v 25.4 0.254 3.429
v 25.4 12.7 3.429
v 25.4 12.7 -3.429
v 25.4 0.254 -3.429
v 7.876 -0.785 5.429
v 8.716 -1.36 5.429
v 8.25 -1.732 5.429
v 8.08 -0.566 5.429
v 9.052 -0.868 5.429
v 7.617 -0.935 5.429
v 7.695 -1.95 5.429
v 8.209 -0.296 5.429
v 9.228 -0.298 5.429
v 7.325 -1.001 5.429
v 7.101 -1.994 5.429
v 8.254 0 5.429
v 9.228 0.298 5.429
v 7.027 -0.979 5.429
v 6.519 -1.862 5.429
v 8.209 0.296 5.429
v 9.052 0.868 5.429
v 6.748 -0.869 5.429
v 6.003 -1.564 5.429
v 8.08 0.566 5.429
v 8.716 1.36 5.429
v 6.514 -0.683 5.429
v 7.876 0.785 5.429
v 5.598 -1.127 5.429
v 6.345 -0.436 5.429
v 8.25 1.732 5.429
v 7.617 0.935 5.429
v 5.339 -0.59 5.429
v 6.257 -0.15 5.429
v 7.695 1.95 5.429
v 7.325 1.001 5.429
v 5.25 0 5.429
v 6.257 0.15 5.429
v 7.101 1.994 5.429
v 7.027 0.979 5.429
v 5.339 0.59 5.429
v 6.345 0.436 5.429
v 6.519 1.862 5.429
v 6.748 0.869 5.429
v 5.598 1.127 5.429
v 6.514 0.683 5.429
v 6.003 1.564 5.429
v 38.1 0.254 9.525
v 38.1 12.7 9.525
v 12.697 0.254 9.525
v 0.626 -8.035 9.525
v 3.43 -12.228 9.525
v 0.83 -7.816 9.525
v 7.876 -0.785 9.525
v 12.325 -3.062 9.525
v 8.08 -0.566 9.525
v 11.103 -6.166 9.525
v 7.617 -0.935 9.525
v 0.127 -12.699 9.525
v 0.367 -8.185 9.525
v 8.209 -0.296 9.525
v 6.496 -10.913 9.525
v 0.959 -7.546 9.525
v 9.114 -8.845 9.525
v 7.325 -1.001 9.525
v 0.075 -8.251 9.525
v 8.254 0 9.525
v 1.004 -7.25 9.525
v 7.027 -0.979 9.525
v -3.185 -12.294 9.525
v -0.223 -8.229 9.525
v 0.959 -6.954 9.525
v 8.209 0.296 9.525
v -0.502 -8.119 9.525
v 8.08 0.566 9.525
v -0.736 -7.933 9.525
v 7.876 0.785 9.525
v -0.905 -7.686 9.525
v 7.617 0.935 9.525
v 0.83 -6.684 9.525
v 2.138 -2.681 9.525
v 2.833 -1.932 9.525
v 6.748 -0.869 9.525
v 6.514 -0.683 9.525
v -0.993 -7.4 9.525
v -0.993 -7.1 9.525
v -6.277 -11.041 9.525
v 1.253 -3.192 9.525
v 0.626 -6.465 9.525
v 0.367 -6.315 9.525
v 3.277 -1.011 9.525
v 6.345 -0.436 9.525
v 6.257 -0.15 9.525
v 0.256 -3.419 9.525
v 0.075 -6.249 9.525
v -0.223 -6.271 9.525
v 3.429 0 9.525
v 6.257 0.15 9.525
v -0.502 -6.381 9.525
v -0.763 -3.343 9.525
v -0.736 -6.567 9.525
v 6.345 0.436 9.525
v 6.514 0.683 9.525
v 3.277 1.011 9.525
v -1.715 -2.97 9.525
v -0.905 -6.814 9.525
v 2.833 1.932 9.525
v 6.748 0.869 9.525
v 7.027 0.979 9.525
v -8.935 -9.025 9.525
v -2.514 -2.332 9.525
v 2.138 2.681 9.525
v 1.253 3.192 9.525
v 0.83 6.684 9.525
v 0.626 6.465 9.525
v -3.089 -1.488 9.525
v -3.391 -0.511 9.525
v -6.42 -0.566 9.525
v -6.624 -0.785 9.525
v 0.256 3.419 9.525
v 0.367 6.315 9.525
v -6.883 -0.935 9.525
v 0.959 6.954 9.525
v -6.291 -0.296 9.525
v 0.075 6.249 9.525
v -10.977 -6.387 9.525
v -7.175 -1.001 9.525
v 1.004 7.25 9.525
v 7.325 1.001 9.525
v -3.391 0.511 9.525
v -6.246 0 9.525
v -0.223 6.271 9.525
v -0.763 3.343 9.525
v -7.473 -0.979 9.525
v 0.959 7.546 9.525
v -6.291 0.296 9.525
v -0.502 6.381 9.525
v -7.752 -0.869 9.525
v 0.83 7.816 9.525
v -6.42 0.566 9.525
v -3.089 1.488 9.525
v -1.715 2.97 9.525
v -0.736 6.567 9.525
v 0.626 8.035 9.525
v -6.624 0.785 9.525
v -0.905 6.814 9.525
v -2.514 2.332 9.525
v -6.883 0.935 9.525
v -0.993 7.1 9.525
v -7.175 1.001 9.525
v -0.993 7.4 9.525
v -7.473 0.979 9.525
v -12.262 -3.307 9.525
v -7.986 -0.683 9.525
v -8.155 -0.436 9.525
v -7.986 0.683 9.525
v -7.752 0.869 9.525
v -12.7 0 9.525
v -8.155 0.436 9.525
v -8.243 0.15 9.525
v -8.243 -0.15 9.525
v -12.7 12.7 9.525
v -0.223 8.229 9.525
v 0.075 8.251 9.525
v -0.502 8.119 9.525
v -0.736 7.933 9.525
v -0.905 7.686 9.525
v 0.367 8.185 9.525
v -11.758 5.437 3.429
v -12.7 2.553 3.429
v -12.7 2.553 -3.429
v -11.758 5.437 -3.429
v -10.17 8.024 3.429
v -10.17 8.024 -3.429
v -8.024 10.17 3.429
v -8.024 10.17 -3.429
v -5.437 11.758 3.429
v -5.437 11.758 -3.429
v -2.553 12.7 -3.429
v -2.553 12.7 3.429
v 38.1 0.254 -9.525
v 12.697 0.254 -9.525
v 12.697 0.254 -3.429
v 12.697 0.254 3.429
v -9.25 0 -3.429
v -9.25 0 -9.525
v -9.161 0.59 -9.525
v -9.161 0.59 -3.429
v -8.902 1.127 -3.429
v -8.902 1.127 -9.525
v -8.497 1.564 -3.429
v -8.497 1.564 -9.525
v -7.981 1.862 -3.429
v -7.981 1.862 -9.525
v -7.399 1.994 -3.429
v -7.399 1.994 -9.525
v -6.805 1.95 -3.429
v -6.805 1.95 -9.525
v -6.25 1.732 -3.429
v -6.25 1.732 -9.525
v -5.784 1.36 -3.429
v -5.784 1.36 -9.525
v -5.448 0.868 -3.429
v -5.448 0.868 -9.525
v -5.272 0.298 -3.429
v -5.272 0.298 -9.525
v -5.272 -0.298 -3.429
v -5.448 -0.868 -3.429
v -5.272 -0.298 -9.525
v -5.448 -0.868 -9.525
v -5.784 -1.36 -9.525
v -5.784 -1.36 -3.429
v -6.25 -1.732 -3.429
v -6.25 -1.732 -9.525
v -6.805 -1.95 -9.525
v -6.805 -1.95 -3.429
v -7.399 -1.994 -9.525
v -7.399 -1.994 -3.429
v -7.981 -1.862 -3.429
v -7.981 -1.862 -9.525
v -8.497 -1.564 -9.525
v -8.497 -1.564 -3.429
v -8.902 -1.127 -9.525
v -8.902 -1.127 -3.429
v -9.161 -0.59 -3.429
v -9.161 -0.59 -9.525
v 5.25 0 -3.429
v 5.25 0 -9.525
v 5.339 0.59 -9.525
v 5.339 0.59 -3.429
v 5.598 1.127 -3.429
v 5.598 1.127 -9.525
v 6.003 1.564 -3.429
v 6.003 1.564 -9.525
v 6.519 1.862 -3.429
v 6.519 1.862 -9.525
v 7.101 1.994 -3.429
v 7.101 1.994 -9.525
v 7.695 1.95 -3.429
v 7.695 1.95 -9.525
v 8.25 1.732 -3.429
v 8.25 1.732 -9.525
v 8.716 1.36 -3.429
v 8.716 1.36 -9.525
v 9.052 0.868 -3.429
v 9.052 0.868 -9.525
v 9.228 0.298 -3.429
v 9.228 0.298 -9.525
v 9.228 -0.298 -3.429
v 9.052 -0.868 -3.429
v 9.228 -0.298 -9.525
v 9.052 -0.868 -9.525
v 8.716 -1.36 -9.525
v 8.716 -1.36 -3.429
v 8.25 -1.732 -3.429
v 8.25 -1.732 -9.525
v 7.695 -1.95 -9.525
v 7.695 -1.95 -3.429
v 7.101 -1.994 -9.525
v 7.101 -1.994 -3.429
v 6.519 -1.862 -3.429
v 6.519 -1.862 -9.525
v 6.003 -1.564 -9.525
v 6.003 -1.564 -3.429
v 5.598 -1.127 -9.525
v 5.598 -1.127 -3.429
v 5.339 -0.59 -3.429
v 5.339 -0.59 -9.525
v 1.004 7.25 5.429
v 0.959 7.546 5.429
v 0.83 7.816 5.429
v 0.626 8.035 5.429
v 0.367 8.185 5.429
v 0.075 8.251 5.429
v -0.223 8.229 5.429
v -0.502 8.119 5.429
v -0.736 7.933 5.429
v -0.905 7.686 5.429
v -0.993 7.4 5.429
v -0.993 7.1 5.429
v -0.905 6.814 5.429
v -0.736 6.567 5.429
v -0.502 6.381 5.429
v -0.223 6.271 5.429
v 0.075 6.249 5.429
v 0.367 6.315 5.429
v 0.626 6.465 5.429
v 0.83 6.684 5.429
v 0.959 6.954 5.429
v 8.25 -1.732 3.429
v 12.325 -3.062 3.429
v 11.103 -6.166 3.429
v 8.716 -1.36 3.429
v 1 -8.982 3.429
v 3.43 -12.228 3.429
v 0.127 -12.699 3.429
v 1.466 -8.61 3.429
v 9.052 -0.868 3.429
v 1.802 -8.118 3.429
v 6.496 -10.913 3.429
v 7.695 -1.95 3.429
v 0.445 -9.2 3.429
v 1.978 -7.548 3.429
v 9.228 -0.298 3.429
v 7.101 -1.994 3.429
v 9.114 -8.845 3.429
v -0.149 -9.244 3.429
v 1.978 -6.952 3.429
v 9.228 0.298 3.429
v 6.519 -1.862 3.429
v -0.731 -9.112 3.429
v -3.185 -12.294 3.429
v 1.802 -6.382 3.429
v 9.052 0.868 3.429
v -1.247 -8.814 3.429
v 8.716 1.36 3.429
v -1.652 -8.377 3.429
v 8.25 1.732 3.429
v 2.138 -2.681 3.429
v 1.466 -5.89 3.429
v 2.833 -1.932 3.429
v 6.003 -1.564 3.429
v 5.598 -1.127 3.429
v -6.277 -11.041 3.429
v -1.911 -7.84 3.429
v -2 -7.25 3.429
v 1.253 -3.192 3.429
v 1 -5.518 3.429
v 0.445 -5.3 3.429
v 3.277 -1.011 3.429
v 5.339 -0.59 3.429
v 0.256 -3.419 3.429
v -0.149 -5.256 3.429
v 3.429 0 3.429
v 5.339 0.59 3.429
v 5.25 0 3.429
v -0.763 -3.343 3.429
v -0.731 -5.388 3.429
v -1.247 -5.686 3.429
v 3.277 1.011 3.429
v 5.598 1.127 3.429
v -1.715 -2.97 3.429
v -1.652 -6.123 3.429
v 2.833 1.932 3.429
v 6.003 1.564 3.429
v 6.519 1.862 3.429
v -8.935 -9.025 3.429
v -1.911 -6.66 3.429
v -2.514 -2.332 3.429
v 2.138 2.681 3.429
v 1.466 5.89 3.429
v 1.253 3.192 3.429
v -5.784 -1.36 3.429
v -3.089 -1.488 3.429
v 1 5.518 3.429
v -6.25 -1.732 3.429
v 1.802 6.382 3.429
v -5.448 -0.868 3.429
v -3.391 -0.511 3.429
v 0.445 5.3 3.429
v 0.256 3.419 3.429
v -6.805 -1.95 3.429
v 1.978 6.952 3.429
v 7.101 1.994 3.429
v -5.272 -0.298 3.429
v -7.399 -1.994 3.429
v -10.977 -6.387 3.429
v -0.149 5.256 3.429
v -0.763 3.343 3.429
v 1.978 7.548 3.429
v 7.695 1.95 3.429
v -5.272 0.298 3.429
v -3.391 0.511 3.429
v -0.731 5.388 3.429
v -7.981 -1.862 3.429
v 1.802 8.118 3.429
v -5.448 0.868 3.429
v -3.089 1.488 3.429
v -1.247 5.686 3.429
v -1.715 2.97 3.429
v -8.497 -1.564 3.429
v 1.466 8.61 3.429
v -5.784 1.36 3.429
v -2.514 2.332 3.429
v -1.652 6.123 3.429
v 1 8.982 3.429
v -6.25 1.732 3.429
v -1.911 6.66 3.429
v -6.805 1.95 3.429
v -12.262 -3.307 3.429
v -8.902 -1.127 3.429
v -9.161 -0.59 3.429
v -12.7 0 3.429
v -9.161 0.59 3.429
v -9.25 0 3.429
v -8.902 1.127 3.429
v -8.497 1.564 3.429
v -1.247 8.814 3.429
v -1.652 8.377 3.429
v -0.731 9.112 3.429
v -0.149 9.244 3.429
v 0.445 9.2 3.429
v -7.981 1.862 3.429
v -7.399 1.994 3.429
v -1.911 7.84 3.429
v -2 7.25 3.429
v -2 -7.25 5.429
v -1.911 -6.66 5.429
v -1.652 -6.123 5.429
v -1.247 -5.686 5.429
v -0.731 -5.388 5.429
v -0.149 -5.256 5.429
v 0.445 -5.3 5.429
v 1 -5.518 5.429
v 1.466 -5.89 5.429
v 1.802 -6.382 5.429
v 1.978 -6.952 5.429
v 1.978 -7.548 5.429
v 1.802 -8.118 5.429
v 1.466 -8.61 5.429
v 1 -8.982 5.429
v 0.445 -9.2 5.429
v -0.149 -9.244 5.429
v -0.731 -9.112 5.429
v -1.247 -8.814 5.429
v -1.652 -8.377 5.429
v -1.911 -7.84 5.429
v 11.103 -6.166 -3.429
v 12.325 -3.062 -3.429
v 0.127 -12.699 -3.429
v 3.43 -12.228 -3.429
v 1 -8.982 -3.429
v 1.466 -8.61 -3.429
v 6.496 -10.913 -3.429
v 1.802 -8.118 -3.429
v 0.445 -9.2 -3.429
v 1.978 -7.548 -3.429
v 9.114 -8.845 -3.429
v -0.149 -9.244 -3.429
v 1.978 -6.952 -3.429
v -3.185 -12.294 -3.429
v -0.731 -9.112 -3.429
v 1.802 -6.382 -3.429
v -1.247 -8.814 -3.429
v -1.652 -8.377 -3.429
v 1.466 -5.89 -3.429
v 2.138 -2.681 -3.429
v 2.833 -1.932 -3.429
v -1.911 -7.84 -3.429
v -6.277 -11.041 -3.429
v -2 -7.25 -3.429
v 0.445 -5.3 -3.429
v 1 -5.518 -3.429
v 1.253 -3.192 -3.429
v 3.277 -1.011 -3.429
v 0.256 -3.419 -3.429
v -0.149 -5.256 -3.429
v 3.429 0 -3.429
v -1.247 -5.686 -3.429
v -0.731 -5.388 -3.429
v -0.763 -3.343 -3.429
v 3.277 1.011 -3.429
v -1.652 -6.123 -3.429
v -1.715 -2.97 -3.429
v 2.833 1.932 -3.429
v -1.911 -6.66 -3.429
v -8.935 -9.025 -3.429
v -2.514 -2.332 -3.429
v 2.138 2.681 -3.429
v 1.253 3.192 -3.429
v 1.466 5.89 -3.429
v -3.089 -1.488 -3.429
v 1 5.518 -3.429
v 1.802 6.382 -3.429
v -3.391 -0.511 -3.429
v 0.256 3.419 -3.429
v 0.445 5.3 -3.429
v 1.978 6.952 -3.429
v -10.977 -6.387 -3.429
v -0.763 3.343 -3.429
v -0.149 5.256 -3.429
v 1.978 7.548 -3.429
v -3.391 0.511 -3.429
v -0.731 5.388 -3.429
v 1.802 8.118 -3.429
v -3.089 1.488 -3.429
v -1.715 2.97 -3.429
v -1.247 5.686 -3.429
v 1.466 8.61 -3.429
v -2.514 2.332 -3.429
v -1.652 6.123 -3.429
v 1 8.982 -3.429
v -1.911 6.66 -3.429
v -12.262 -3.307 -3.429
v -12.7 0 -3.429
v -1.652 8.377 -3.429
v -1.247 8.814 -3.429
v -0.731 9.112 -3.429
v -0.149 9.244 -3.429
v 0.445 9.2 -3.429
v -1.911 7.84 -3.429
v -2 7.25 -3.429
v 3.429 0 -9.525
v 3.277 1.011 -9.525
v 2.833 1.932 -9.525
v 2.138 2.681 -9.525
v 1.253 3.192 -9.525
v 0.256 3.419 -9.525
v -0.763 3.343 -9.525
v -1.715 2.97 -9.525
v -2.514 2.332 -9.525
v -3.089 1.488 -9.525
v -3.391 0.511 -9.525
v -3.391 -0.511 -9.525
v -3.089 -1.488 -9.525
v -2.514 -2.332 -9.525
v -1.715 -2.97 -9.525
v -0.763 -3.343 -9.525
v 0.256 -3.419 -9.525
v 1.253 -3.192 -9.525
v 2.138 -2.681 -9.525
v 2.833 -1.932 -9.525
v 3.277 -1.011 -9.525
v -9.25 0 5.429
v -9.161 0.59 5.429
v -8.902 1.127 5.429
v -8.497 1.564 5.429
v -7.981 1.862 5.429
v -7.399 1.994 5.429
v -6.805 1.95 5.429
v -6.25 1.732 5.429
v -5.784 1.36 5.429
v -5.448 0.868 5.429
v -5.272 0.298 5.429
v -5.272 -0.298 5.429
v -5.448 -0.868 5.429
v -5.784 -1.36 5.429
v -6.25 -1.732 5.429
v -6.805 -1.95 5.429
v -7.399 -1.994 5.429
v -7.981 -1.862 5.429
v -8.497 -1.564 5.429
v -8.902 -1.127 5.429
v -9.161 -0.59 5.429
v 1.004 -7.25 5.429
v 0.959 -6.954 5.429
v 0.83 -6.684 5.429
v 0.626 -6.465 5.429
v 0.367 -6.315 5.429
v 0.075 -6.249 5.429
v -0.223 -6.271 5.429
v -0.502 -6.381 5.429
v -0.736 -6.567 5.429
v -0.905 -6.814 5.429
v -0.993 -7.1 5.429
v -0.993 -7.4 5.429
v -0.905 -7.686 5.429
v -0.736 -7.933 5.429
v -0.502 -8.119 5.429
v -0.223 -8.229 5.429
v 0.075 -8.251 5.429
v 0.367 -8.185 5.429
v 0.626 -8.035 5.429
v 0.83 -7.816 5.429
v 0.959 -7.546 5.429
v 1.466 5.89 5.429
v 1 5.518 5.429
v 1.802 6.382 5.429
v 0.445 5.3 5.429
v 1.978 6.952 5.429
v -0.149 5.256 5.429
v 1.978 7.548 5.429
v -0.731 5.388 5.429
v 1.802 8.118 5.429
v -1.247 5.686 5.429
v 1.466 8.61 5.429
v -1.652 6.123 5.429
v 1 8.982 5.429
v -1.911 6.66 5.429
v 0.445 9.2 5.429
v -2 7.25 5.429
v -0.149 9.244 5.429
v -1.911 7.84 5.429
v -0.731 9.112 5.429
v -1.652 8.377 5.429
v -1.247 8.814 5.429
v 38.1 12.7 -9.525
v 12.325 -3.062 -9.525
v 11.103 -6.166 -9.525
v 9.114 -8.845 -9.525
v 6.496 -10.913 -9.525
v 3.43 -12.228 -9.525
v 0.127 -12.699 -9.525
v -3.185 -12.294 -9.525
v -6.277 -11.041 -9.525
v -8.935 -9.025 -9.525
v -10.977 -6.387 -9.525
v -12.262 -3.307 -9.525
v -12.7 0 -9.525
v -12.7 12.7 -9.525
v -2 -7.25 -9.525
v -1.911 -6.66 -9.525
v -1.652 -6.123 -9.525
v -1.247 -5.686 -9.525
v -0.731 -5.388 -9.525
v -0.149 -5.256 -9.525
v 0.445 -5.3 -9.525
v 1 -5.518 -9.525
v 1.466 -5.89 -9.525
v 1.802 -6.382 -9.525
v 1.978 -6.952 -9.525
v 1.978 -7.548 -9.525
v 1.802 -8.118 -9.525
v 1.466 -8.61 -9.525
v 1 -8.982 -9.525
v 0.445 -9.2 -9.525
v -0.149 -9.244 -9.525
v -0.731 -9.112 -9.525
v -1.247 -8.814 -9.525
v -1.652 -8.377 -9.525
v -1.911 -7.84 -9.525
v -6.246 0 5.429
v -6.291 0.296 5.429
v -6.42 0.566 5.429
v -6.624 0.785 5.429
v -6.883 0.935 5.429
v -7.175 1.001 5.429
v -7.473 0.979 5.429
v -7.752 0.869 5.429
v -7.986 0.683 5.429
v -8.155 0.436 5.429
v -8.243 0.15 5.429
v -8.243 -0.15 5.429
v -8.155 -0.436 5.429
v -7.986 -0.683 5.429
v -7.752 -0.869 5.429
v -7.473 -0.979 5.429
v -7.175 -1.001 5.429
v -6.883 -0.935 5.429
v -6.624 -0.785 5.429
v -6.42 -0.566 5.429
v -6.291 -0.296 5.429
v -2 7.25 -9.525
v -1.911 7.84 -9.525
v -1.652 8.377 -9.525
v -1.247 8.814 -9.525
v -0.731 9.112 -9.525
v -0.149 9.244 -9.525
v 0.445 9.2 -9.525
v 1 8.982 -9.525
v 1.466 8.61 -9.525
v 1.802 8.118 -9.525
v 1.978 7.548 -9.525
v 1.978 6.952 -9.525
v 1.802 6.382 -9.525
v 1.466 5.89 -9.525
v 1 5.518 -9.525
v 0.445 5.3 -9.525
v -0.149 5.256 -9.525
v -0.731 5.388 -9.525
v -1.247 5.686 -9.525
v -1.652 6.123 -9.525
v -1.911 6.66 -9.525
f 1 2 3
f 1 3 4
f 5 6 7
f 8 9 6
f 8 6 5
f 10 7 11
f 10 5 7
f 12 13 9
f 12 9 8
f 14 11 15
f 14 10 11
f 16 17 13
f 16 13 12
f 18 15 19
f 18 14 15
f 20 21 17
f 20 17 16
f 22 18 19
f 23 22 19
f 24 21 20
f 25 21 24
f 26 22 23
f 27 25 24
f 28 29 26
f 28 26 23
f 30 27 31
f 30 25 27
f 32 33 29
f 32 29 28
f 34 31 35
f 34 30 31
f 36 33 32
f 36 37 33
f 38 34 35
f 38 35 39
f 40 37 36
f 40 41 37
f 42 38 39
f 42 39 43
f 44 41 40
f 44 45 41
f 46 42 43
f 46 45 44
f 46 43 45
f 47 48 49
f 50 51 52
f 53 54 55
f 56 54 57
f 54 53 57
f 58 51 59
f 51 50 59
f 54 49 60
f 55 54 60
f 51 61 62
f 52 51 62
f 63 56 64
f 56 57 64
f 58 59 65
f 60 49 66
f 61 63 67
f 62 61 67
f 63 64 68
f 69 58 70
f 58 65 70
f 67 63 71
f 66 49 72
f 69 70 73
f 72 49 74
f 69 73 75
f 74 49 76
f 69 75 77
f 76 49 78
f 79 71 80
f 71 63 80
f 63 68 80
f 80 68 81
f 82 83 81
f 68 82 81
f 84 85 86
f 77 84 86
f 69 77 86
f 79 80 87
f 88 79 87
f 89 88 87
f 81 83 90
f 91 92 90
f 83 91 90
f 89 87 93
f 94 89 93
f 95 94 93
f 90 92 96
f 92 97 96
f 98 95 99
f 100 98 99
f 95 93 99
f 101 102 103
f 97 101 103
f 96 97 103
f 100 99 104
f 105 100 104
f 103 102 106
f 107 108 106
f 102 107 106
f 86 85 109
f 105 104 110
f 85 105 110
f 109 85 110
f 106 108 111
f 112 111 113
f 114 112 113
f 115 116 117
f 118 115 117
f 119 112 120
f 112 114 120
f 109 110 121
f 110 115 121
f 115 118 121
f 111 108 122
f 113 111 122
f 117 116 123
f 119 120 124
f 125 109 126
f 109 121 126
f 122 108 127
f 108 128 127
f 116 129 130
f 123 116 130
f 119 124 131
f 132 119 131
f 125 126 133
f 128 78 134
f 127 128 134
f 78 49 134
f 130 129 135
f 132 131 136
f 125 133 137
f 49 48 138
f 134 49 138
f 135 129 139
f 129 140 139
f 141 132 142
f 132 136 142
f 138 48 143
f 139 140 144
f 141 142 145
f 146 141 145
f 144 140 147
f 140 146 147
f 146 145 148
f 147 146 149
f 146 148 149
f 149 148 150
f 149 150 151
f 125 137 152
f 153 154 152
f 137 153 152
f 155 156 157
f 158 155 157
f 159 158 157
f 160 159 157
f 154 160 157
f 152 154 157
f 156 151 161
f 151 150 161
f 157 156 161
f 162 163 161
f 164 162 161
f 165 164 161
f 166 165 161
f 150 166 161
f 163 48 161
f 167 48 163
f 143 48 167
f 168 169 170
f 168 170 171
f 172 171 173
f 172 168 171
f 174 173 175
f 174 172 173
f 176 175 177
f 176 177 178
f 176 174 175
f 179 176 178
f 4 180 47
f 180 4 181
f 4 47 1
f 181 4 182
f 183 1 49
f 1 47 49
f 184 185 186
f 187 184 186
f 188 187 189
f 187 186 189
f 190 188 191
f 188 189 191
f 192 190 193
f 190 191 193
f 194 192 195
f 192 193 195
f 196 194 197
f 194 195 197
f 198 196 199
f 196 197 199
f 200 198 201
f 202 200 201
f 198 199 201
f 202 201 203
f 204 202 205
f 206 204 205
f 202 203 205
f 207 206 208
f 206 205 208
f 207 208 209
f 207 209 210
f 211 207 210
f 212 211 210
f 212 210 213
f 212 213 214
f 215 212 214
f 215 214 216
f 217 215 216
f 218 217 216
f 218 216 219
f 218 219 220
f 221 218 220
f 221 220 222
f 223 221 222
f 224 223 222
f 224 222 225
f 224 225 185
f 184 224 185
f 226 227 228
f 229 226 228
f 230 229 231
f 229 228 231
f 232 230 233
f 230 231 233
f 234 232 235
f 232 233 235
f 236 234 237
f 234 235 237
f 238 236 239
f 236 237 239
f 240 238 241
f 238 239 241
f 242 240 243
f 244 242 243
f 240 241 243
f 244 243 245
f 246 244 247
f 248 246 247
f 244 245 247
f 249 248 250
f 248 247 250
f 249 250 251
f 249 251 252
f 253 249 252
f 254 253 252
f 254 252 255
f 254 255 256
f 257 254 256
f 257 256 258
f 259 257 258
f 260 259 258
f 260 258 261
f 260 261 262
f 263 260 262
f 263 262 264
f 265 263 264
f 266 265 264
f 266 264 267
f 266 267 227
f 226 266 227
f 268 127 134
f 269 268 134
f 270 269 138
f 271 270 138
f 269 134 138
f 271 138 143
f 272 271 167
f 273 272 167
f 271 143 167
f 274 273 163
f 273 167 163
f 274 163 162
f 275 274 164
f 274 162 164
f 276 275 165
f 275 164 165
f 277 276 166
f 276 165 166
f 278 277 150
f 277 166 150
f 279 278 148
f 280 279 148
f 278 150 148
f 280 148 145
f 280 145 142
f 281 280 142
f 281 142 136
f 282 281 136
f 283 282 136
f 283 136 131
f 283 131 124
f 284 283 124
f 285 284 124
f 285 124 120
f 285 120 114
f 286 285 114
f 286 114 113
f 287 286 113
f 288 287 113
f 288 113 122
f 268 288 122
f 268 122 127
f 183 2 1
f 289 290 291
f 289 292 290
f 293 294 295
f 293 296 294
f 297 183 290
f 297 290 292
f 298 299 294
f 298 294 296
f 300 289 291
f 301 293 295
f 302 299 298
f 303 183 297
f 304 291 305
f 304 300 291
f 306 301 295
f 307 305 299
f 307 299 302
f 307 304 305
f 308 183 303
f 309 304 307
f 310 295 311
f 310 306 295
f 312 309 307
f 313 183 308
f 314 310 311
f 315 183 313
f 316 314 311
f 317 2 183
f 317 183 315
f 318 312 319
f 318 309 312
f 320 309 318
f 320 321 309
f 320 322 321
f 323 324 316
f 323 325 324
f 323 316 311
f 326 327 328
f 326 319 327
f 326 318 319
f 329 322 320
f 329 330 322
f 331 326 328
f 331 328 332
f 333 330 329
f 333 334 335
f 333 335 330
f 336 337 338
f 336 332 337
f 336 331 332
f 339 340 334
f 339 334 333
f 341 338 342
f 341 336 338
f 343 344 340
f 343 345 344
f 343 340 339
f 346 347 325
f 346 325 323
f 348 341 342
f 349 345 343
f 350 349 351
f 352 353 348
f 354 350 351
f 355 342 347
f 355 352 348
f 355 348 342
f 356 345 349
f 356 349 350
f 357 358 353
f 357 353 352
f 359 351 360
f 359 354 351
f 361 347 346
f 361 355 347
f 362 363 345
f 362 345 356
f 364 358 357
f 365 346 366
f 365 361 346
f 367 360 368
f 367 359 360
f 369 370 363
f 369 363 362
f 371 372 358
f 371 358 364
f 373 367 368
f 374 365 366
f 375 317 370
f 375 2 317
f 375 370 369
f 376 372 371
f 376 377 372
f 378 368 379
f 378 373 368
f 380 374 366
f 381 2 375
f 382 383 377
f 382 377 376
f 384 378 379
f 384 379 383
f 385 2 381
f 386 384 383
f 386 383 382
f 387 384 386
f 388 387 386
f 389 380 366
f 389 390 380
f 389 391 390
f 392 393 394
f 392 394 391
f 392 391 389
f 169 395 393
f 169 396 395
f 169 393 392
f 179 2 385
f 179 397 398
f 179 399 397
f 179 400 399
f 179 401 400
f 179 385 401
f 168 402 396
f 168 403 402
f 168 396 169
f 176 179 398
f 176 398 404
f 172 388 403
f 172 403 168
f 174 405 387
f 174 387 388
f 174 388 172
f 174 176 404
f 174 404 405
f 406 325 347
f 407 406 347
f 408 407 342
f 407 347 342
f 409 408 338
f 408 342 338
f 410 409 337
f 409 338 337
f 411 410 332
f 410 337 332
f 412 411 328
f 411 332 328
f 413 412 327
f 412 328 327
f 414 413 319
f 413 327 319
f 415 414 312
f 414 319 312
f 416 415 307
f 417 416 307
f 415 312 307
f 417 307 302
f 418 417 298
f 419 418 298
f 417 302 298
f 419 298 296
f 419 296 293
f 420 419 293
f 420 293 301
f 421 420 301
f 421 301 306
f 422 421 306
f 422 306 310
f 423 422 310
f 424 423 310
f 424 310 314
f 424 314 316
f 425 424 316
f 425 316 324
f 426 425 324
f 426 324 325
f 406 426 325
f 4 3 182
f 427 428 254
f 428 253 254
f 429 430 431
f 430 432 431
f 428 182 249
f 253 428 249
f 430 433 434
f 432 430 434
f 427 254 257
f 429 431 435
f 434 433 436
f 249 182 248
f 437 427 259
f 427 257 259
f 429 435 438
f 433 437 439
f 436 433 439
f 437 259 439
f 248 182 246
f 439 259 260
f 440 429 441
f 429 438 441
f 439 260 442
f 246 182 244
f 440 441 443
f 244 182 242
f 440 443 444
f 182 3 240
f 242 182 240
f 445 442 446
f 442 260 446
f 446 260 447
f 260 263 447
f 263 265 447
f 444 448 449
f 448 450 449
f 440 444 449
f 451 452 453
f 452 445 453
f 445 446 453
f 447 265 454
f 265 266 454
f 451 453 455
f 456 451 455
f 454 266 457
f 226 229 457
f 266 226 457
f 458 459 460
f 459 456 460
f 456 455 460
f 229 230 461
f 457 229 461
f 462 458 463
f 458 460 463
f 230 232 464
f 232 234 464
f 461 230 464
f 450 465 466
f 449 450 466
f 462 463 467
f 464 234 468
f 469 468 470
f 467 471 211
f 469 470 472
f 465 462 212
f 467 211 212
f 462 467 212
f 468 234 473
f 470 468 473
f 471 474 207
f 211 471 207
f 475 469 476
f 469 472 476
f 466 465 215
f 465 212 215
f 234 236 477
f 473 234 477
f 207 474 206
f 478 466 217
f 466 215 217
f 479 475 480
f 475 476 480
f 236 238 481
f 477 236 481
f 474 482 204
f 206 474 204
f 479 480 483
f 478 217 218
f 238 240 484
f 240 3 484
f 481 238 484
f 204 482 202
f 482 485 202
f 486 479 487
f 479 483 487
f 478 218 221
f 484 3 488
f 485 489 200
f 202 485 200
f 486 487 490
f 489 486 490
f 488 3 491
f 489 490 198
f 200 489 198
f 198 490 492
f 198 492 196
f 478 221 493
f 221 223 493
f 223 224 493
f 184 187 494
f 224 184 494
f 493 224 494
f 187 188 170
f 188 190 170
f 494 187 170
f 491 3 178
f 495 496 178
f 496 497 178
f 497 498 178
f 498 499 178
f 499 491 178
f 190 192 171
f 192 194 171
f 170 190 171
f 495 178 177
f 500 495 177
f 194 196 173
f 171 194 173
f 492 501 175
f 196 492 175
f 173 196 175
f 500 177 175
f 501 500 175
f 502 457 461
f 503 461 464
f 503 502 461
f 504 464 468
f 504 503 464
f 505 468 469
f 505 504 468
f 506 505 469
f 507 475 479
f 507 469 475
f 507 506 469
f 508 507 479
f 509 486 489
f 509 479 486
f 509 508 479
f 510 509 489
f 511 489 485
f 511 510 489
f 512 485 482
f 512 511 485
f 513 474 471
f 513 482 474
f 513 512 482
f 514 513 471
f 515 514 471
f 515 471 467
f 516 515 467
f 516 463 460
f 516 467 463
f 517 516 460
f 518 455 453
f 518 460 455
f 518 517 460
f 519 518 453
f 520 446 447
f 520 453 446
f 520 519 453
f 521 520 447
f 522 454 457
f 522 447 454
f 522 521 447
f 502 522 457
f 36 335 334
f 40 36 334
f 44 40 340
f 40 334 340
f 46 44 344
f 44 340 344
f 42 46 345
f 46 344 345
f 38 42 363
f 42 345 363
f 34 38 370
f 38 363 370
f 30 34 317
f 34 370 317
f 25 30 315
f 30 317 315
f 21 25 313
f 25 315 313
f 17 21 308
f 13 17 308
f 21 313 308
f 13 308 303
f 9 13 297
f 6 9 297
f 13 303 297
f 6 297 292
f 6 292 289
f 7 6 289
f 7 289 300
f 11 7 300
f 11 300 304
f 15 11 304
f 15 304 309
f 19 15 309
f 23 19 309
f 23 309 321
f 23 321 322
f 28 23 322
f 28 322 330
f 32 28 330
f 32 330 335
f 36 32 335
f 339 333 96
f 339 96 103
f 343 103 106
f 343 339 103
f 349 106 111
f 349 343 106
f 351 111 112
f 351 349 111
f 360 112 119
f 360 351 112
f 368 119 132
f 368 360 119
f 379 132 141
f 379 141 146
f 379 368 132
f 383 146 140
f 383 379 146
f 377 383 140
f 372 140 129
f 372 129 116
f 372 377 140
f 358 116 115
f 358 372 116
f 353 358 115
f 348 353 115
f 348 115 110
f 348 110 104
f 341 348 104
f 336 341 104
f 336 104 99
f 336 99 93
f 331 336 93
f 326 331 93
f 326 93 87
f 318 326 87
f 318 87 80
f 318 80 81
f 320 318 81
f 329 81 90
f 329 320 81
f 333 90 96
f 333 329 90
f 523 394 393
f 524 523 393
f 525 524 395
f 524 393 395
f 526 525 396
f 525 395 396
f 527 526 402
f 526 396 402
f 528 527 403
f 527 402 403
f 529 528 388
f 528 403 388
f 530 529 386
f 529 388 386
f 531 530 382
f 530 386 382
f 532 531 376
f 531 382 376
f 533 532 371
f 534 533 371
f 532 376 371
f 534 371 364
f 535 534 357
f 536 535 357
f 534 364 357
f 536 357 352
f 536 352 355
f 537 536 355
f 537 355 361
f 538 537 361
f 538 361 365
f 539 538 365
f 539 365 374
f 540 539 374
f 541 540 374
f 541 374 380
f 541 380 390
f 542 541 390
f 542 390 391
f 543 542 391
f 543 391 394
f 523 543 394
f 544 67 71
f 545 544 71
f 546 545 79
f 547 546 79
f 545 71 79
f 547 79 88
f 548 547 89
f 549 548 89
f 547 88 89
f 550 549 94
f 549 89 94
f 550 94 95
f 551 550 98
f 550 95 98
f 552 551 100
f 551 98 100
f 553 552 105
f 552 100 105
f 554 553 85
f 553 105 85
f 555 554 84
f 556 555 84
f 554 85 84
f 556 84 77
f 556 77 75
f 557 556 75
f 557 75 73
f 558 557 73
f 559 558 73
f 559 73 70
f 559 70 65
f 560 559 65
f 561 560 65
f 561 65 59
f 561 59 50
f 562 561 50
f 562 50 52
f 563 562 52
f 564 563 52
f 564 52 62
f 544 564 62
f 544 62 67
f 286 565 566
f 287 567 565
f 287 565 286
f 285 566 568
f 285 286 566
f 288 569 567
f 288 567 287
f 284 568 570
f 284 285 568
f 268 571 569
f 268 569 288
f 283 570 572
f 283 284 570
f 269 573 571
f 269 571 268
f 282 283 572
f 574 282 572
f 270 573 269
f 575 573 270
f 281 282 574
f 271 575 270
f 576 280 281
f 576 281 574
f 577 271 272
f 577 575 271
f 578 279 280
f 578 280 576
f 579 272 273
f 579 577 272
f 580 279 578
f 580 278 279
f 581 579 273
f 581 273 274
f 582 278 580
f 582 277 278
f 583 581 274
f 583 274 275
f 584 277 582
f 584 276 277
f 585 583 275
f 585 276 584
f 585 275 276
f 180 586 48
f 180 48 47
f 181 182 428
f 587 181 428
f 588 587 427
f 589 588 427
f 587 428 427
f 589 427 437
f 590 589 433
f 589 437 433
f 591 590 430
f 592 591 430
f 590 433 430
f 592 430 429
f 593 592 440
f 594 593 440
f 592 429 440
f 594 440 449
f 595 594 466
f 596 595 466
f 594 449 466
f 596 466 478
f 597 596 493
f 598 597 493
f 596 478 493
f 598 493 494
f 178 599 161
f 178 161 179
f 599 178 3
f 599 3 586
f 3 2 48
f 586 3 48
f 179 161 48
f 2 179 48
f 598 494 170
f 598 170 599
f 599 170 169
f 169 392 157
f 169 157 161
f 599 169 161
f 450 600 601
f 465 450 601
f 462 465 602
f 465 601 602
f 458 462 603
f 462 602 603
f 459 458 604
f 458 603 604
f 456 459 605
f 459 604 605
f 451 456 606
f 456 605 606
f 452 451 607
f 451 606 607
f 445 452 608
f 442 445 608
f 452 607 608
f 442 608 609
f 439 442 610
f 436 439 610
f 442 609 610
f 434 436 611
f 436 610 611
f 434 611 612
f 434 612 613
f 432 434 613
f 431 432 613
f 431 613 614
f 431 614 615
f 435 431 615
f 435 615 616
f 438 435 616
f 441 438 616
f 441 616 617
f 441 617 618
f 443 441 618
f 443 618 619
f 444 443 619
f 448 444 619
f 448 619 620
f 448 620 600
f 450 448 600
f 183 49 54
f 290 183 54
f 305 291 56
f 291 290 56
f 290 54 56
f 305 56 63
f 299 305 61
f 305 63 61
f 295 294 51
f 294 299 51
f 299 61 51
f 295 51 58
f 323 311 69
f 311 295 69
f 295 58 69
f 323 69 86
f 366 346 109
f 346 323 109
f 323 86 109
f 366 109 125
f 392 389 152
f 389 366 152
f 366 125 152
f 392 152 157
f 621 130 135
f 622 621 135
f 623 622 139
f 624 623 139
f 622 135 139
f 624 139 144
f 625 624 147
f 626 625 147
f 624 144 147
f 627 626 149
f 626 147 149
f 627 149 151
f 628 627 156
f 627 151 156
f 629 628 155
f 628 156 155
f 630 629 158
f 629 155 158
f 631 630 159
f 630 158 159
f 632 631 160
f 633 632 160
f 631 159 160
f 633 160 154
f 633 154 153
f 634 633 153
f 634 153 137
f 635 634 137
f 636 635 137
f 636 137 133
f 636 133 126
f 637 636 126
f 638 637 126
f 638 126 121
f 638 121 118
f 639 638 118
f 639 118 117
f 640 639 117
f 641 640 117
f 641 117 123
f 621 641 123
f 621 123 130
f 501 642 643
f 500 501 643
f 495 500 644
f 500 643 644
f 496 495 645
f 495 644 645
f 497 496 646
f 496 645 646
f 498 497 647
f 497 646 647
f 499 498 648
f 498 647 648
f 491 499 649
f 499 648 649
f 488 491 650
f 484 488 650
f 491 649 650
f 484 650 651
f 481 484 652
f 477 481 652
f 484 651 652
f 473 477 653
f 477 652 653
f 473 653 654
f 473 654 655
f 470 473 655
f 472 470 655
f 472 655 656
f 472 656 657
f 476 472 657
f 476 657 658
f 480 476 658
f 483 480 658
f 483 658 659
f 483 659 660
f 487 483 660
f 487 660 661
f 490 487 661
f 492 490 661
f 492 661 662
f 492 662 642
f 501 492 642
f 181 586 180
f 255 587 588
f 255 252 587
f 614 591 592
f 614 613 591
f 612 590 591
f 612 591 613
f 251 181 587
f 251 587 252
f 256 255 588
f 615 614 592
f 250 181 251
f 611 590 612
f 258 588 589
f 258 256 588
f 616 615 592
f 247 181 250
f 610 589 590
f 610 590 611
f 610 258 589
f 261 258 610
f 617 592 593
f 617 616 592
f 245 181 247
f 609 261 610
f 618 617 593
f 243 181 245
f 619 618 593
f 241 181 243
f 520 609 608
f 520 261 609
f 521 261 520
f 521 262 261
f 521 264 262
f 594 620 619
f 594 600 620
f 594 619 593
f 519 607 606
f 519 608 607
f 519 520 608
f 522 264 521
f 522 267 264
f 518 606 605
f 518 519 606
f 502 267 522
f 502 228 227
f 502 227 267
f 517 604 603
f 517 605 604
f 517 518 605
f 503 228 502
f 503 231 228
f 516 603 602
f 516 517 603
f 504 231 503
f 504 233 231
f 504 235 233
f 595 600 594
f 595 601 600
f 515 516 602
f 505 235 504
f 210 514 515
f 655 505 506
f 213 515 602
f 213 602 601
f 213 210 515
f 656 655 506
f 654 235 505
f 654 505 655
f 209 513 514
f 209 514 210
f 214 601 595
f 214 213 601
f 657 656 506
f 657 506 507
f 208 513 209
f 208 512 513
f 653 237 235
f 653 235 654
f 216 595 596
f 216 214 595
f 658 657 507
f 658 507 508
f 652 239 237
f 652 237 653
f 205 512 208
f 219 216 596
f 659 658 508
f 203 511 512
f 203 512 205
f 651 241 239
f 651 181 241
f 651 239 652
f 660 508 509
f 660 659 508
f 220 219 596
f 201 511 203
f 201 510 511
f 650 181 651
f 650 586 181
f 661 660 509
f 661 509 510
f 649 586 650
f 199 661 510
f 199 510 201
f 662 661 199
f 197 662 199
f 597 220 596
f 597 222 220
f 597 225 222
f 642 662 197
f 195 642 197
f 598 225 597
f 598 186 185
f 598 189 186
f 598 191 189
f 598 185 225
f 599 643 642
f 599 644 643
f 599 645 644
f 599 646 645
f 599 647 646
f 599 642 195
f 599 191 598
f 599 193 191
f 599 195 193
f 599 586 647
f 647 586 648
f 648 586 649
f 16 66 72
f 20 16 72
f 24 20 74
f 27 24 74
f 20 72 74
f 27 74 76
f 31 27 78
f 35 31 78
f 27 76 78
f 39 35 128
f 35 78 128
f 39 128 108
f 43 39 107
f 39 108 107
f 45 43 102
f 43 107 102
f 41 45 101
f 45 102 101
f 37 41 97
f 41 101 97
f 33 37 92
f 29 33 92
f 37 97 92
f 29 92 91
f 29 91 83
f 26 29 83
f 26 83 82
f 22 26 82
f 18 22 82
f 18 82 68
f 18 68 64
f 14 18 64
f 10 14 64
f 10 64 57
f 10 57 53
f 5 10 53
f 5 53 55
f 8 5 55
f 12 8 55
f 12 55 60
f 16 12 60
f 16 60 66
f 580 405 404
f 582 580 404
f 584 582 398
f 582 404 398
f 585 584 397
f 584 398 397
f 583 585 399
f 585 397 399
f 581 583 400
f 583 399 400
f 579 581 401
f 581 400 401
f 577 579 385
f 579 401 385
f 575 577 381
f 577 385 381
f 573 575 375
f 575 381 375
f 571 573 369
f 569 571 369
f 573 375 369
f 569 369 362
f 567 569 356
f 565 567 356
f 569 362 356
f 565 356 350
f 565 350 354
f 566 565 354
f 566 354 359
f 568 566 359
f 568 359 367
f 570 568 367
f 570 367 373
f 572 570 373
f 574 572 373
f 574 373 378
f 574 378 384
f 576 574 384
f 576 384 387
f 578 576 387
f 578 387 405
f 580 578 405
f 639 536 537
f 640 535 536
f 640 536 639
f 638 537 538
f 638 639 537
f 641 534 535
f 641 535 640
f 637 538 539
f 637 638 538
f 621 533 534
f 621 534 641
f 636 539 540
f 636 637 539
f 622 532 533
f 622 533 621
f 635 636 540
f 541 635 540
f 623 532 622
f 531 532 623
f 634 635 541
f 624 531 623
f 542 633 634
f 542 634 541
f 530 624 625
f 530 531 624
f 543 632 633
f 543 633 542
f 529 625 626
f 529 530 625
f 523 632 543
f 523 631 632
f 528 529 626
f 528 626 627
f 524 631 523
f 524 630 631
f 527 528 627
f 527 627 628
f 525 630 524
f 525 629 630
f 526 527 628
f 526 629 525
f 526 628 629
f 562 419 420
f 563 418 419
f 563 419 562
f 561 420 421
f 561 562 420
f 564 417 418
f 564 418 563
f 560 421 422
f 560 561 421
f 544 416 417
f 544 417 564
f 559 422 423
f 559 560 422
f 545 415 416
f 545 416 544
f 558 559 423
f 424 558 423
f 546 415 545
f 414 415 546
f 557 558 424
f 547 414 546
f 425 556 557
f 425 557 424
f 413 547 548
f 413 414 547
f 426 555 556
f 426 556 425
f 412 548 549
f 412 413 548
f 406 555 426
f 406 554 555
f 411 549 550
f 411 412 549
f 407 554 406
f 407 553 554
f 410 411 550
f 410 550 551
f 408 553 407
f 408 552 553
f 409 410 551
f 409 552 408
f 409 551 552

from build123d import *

# Parameters (mm, degrees)
SKETCH1_R           = 3.429
BOSS_EXTRUDE1_DEPTH = 9.525
CUT_EXTRUDE1_START  = -9.525
CUT_EXTRUDE1_DEPTH  = 3.429
SKETCH4_R           = 1.004000024
CUT_EXTRUDE2_DEPTH  = 20.05
SKETCH5_R           = 2.000000064
CUT_EXTRUDE3_DEPTH  = 14.954


with BuildPart() as part:
    # Sketch1 → Boss-Extrude1 (new body, symmetric)
    with BuildSketch(Plane.XY):
        with BuildLine():
            Line((-12.7, 0), (-12.7, 12.7))
            Line((-12.7, 12.7), (38.1, 12.7))
            Line((38.1, 12.7), (38.1, 0.254))
            Line((38.1, 0.254), (12.697459746, 0.254))
            ThreePointArc((12.697459746, 0.254), (0.127006351, -12.699364921), (-12.7, 0))
        make_face()
        Circle(SKETCH1_R, mode=Mode.SUBTRACT)
    extrude(amount=BOSS_EXTRUDE1_DEPTH, both=True)

    # Sketch3 → Cut-Extrude1 (cut, symmetric)
    with BuildSketch(Plane.XY.offset(9.525).offset(CUT_EXTRUDE1_START)):
        with BuildLine():
            Line((25.4, 12.7), (25.4, 0.254))
            Line((25.4, 0.254), (12.951509565, 0.254))
            ThreePointArc((12.951509565, 0.254), (-9.069614104, -9.24922786), (0, 12.954))
            Line((0, 12.954), (0, 12.7))
            Line((0, 12.7), (25.4, 12.7))
        make_face()
    extrude(amount=CUT_EXTRUDE1_DEPTH, both=True, mode=Mode.SUBTRACT)

    # Sketch4 → Cut-Extrude2 (cut, through all)
    with BuildSketch(Plane.XY.offset(9.525)):
        with Locations((7.249999978, 0)):
            Circle(SKETCH4_R)
        with Locations((0, -7.249999978)):
            Circle(SKETCH4_R)
        with Locations((-7.249999978, 0)):
            Circle(SKETCH4_R)
        with Locations((0, 7.249999978)):
            Circle(SKETCH4_R)
    extrude(amount=-CUT_EXTRUDE2_DEPTH, mode=Mode.SUBTRACT)

    # Sketch5 → Cut-Extrude3 (cut)
    with BuildSketch(Plane(origin=(0, 0, -9.525), x_dir=(-1, 0, 0), z_dir=(0, 0, -1))):
        with Locations((7.249999978, 0)):
            Circle(SKETCH5_R)
        with Locations((0, -7.249999978)):
            Circle(SKETCH5_R)
        with Locations((-7.249999978, 0)):
            Circle(SKETCH5_R)
        with Locations((0, 7.249999978)):
            Circle(SKETCH5_R)
    extrude(amount=-CUT_EXTRUDE3_DEPTH, mode=Mode.SUBTRACT)


solid = part.part
